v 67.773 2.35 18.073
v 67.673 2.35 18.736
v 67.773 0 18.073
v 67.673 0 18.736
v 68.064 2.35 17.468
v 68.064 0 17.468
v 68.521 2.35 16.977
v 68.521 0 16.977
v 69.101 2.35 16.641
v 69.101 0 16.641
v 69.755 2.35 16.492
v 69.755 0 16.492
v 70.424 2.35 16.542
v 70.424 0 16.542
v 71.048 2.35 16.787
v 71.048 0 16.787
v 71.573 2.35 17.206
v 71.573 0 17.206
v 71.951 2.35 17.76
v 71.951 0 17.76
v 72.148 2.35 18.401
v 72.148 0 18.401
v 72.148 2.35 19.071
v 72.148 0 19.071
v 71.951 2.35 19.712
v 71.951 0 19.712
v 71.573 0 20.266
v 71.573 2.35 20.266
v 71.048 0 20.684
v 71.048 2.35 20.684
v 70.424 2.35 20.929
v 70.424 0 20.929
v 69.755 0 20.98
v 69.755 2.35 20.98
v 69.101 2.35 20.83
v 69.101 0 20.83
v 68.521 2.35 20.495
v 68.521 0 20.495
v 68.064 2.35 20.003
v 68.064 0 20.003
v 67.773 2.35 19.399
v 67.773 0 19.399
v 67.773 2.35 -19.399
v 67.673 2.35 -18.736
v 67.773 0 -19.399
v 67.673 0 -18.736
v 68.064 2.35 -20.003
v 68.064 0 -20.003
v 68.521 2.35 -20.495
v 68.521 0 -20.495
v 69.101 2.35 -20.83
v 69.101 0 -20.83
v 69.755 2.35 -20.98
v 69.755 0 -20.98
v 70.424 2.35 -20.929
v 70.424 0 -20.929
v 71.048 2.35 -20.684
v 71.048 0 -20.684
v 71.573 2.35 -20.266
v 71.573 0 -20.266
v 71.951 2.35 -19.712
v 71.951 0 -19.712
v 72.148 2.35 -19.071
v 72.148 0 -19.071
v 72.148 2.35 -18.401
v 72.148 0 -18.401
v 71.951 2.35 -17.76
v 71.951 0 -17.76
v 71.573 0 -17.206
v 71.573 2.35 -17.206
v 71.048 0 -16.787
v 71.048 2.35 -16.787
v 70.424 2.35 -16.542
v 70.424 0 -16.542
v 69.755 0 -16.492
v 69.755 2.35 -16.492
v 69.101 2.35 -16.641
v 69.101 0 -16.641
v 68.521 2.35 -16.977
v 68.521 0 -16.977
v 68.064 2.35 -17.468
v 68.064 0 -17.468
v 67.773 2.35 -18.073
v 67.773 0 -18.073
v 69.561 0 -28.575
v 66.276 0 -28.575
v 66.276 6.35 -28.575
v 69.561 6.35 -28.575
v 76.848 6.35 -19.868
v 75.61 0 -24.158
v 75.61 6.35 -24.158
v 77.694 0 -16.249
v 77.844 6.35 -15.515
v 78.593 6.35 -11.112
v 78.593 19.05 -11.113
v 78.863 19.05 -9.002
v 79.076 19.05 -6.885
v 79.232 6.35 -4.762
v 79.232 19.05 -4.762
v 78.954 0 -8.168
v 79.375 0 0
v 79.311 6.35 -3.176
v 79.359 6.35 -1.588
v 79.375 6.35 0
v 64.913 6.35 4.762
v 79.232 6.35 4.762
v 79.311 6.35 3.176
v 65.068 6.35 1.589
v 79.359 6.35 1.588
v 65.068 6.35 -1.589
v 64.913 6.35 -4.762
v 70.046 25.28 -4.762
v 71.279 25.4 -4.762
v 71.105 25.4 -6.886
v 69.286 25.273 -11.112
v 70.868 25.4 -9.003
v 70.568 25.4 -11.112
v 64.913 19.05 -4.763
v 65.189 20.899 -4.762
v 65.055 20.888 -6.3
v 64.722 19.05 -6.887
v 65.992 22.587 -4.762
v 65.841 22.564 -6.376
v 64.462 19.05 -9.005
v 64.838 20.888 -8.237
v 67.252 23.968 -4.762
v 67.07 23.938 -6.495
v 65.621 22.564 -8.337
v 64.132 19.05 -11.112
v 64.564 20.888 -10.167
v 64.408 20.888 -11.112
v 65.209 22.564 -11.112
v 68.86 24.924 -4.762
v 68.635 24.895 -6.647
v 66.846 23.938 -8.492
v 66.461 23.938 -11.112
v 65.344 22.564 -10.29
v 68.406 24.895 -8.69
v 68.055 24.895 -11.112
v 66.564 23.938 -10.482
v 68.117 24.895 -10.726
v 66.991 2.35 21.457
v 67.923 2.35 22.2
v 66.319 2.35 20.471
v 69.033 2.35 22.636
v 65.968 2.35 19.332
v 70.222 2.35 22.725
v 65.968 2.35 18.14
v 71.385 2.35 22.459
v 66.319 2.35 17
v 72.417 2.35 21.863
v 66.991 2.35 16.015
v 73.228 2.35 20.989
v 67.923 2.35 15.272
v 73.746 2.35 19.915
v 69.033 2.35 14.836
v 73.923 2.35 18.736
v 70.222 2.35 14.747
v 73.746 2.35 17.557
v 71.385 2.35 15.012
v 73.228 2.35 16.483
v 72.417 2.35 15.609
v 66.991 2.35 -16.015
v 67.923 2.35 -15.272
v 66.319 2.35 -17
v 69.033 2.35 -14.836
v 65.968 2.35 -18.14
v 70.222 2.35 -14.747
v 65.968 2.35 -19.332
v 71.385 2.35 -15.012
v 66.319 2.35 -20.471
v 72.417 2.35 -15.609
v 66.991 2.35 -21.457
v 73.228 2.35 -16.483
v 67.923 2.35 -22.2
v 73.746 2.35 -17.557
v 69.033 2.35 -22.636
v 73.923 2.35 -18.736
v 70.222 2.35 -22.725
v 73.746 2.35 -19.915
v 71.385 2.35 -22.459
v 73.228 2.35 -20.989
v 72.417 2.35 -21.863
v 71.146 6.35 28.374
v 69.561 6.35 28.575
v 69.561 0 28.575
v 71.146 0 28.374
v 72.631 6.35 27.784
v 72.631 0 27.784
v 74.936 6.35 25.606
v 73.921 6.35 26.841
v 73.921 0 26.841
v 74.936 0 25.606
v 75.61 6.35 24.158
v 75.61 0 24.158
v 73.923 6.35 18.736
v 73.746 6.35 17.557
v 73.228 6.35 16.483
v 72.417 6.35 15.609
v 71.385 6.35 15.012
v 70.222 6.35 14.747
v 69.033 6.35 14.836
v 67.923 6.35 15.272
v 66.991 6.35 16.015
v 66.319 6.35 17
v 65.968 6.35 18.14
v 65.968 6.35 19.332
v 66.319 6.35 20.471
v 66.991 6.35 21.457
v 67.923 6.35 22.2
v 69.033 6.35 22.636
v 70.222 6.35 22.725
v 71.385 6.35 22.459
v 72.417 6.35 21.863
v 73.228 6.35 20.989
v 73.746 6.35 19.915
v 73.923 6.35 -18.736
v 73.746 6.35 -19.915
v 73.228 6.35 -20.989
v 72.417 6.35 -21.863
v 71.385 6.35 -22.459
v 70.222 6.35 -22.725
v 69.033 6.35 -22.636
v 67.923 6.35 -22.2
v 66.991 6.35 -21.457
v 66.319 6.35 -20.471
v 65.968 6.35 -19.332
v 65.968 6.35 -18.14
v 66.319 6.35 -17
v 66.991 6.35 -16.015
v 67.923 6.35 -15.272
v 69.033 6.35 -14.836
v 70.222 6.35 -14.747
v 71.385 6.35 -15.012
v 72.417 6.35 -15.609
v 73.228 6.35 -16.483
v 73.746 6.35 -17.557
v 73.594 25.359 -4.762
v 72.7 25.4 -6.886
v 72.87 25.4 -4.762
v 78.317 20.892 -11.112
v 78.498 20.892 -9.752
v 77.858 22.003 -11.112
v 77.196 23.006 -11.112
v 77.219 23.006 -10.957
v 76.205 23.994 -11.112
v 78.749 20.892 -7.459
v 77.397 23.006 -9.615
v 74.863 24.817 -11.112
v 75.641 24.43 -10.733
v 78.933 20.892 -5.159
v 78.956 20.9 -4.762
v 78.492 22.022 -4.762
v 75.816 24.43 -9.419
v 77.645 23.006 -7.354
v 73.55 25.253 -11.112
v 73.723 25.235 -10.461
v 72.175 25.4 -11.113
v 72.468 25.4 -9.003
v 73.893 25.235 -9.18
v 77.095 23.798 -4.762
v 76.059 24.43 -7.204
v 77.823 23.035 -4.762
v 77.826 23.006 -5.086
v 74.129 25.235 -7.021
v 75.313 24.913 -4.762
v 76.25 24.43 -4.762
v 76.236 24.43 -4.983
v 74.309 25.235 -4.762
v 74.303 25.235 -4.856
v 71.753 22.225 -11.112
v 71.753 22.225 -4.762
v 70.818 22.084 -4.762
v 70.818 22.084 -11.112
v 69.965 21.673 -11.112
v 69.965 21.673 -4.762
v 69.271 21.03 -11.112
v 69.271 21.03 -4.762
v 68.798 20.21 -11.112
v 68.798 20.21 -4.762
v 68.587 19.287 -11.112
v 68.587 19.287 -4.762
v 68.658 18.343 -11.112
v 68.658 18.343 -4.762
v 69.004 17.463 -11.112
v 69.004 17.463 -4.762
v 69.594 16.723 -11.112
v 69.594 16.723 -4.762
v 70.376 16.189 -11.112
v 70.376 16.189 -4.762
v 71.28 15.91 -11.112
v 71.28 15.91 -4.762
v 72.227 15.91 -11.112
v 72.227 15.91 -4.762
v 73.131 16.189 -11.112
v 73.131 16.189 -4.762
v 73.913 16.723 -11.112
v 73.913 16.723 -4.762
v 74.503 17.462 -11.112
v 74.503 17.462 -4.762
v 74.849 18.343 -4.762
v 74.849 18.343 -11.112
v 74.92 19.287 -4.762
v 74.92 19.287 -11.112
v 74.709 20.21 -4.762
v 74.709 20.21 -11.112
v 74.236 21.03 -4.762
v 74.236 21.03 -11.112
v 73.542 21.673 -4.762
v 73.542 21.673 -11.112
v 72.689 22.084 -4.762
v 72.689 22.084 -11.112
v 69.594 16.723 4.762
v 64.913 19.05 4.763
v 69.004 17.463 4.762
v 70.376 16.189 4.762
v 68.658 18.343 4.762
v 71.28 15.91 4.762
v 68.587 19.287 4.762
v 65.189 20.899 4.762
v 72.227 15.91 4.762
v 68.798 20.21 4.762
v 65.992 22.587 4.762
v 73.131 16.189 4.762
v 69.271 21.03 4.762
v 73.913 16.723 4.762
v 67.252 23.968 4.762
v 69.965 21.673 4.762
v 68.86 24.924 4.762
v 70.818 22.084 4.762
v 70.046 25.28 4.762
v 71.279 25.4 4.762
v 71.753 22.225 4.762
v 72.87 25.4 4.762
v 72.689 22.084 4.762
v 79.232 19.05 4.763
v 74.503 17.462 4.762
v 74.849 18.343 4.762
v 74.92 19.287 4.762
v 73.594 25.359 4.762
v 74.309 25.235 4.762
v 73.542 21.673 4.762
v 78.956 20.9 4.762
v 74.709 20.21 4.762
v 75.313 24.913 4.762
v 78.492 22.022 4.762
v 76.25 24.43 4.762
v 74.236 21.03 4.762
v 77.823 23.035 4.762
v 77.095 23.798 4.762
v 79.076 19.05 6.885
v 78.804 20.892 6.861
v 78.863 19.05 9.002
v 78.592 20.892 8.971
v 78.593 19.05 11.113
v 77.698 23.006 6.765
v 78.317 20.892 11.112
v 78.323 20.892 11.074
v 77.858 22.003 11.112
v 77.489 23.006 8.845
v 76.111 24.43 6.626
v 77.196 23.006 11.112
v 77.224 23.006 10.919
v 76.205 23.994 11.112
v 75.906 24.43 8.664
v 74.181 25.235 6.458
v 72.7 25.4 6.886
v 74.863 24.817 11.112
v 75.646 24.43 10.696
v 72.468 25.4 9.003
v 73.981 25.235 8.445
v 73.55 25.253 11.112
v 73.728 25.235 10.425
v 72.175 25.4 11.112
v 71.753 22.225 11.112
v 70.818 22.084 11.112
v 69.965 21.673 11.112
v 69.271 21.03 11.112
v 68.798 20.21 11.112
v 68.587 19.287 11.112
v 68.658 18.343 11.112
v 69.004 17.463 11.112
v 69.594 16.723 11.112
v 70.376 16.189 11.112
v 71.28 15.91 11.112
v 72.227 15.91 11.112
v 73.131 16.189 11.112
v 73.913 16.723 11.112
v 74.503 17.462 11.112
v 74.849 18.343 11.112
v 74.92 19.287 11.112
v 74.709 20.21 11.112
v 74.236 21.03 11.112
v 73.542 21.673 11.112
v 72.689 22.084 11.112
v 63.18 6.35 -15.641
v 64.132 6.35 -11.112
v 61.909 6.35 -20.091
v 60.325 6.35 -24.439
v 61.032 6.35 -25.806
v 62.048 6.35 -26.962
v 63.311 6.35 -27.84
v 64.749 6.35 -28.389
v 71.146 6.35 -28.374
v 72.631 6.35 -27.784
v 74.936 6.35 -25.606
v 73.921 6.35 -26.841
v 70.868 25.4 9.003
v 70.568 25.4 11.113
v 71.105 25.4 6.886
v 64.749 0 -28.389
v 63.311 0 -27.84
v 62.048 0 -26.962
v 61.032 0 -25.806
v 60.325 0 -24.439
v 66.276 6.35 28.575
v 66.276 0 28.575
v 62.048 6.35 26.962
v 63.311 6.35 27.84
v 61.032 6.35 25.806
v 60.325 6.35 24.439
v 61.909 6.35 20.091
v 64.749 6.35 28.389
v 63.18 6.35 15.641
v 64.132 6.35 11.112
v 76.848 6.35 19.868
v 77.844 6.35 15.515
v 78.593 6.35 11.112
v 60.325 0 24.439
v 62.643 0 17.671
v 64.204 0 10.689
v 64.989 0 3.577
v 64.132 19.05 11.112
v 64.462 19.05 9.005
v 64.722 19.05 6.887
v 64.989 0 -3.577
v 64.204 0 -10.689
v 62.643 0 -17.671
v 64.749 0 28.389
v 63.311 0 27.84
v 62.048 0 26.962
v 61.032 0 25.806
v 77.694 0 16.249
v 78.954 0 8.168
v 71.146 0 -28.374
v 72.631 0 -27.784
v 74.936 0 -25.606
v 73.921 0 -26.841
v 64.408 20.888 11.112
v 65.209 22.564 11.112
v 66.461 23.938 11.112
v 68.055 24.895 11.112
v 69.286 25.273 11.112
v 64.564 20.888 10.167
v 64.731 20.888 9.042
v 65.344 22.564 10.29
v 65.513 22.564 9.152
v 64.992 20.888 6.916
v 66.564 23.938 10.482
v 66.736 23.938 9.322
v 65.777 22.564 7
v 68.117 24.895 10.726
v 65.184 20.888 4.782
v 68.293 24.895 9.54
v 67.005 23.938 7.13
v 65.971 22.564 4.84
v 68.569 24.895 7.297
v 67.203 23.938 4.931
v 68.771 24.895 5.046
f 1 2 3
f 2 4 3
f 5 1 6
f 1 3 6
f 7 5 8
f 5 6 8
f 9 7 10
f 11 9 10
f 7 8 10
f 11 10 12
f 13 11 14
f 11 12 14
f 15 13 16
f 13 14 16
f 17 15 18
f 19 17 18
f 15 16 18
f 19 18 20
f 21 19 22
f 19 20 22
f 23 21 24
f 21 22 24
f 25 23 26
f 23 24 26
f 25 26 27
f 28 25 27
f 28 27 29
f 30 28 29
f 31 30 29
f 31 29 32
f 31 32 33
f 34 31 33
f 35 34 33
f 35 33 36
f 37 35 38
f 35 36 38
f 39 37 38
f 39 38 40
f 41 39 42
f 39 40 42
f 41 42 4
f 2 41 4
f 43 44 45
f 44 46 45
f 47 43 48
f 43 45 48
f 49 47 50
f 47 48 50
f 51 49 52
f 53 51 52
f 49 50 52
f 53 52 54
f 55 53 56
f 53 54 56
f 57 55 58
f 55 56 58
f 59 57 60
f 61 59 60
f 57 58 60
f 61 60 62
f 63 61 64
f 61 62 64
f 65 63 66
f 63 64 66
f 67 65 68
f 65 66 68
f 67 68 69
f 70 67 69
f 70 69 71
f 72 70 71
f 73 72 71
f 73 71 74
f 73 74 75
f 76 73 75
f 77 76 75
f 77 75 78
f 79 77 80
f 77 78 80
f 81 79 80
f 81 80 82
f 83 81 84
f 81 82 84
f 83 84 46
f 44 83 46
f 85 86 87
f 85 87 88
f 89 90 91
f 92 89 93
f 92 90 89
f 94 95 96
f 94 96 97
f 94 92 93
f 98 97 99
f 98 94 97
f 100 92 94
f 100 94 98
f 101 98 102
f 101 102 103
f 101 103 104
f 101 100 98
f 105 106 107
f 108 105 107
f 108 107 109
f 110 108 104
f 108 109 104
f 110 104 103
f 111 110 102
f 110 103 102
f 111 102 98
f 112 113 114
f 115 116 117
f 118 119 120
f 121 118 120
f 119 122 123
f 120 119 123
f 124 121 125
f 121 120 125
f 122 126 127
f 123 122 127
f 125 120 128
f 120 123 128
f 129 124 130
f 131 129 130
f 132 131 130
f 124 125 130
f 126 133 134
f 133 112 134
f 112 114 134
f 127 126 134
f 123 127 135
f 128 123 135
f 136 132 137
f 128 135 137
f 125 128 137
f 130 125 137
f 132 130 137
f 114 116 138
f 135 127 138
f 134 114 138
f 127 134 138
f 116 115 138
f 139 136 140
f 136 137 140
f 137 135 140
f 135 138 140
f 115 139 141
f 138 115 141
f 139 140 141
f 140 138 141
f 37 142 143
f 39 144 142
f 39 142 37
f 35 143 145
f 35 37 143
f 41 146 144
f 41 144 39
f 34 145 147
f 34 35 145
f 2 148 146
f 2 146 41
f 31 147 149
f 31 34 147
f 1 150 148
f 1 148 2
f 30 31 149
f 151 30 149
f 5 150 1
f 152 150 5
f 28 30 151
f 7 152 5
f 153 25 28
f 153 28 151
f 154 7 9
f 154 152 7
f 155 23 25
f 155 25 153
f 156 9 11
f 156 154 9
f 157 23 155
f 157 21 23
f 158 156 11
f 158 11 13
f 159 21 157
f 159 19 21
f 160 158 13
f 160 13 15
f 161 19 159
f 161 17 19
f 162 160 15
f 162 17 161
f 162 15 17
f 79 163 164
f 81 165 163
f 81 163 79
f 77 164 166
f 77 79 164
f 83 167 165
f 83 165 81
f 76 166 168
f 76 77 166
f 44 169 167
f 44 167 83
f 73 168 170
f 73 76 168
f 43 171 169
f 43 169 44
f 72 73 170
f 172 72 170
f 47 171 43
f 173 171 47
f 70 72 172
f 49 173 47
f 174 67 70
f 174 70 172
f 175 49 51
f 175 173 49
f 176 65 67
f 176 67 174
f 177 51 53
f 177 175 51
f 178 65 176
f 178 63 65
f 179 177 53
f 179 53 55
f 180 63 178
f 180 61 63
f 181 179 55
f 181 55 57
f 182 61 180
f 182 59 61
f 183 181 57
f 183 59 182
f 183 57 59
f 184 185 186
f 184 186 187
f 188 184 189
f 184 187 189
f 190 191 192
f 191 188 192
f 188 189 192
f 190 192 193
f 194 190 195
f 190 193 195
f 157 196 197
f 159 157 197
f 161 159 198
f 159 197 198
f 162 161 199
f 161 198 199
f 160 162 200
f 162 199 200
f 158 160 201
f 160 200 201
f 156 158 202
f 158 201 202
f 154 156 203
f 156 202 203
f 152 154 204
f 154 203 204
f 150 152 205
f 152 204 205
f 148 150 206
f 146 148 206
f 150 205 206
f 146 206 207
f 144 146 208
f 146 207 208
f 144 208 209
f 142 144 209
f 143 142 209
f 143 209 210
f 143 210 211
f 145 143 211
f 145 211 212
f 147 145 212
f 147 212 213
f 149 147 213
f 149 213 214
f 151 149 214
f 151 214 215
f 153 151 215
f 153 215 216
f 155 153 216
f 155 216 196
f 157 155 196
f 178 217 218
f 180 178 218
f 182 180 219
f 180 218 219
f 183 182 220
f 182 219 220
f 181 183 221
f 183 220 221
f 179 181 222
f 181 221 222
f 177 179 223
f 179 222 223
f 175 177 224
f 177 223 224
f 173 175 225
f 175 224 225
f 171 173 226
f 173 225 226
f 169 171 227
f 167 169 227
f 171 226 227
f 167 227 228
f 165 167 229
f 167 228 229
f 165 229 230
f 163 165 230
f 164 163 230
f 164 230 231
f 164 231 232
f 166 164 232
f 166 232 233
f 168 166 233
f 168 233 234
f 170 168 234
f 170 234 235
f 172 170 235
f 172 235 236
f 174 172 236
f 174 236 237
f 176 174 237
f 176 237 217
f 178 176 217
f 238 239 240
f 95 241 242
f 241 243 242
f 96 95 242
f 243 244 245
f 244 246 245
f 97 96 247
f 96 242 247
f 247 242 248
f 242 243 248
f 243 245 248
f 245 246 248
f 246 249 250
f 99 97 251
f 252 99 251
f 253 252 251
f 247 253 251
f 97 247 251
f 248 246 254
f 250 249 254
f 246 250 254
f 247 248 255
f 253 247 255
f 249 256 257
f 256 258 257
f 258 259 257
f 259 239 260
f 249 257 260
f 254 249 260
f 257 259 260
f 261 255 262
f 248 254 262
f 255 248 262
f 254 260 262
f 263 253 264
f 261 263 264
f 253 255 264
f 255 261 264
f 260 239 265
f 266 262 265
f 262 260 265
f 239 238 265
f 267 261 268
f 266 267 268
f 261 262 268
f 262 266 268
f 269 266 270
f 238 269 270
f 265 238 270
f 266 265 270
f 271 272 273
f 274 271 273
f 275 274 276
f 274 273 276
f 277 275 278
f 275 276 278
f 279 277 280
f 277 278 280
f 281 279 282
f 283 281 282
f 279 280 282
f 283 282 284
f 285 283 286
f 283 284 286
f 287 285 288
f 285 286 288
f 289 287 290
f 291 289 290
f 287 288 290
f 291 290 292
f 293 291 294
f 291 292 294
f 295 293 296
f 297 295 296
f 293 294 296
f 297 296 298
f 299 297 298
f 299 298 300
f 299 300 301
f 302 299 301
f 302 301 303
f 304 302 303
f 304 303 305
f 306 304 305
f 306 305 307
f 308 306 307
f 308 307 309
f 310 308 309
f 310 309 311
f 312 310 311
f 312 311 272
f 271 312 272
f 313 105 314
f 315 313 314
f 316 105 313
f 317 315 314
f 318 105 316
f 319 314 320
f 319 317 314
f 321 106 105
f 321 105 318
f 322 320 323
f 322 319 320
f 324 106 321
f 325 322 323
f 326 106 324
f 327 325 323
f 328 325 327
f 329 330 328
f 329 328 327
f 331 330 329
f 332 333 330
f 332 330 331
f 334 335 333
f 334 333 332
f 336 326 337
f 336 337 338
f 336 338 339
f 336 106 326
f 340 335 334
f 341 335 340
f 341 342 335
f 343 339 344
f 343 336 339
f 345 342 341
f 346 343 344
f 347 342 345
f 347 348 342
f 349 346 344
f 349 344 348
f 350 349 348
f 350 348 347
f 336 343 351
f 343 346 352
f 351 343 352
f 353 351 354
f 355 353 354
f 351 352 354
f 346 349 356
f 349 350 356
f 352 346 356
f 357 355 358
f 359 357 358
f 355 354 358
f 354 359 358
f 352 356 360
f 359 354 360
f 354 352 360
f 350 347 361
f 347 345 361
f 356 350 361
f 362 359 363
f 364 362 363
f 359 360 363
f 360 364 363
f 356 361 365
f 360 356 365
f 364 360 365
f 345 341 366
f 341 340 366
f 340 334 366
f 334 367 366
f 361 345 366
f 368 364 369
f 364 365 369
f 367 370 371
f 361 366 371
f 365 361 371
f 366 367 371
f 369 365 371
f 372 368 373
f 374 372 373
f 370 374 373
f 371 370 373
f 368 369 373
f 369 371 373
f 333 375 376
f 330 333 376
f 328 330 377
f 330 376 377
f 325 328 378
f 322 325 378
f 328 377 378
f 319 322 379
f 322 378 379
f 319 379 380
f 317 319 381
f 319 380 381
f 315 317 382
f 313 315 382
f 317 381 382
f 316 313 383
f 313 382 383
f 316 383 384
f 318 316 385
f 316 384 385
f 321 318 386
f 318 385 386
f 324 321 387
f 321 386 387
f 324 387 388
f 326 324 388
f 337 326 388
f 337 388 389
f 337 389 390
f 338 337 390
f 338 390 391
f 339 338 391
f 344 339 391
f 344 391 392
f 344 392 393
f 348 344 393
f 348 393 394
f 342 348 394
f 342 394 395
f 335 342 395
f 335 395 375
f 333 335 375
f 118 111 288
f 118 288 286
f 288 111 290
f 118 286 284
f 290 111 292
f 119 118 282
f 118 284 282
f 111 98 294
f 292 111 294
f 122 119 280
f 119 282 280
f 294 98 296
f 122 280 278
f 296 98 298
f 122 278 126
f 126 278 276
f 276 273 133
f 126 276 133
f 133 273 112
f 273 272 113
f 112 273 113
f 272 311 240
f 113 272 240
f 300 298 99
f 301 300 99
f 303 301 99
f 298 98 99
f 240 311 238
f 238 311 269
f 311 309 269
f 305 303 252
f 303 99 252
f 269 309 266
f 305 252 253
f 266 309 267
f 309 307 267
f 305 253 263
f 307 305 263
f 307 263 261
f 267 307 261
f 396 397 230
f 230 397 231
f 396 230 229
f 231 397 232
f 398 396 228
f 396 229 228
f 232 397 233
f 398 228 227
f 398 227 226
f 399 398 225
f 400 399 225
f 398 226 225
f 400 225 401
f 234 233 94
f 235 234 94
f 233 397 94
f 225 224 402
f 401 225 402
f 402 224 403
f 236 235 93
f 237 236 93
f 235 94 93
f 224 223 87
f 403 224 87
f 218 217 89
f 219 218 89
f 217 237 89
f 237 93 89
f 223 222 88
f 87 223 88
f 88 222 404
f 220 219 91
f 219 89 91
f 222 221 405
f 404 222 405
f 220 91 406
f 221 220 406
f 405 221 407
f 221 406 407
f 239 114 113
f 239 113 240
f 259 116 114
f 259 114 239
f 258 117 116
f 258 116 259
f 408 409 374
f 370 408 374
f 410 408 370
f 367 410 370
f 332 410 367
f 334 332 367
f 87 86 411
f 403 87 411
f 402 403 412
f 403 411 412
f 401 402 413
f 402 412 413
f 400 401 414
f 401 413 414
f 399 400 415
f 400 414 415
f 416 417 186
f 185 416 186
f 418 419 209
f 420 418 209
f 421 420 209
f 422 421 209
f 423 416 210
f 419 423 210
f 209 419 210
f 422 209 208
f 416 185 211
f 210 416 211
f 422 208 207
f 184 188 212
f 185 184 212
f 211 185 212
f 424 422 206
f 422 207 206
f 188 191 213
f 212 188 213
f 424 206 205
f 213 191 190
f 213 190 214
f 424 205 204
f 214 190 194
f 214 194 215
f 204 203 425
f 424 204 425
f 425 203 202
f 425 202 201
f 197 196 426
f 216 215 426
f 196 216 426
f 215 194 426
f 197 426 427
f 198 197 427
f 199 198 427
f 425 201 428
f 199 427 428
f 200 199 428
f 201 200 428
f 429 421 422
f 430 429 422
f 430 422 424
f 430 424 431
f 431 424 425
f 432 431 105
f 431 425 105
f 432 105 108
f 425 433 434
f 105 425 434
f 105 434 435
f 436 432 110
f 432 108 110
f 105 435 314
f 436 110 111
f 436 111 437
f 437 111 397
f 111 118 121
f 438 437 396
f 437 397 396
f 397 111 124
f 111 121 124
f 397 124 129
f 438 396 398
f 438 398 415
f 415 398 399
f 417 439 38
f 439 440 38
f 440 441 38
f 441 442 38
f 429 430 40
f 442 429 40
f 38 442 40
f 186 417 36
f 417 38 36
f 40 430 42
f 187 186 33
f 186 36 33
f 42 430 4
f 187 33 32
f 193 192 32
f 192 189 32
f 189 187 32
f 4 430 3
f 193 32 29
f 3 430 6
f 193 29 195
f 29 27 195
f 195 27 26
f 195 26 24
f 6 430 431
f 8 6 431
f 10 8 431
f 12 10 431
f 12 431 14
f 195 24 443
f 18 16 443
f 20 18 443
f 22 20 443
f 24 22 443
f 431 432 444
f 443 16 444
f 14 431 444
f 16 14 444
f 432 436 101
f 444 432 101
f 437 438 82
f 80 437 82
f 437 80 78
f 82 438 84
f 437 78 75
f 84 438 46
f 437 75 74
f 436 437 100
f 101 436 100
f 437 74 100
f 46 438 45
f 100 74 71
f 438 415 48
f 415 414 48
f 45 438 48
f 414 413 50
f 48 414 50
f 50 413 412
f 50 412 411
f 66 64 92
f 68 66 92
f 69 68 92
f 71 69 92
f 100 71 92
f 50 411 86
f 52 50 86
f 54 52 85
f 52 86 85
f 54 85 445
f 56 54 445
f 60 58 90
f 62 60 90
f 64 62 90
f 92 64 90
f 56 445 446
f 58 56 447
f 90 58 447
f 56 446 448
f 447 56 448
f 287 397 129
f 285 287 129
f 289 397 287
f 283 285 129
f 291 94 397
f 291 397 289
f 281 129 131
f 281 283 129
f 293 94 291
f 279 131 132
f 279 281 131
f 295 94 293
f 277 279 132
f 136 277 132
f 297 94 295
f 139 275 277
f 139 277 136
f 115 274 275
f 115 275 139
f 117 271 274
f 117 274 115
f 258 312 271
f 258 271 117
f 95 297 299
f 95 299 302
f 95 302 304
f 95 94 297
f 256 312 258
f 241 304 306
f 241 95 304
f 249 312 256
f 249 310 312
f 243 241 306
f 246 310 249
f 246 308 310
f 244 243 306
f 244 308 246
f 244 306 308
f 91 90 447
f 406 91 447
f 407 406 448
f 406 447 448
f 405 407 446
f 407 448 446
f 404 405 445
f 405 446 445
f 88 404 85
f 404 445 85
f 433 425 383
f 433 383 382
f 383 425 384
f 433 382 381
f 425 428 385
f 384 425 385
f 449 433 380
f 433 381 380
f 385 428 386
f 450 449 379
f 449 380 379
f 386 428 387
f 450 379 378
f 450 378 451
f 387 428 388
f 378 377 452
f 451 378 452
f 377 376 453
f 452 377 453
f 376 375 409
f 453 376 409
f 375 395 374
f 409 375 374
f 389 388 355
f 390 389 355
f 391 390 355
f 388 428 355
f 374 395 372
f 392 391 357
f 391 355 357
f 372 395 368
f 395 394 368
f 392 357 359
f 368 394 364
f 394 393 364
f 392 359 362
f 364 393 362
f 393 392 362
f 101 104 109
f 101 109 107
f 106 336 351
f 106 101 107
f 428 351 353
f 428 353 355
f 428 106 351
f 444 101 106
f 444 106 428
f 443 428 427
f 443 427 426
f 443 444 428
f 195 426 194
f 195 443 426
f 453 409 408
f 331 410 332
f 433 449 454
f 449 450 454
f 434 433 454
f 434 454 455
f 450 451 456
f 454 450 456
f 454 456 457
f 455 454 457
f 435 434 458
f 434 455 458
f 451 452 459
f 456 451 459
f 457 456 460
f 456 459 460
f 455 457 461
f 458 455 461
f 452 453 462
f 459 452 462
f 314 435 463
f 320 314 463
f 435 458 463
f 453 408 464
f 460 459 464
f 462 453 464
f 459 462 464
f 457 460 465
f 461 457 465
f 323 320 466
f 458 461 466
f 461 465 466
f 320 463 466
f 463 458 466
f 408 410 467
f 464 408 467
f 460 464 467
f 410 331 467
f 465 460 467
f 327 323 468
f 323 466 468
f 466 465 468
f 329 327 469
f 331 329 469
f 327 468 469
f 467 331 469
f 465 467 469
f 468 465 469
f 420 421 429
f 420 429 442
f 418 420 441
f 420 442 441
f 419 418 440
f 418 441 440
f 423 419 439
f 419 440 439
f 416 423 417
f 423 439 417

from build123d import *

# Parameters (mm, degrees)
SKETCH1_W                      = 19.05
SKETCH1_H                      = 57.15
BOSS_EXTRUDE1_DEPTH            = 25.4
SKETCH8_R                      = 65.0875
CUT_EXTRUDE2_DEPTH             = 89.102674477
SKETCH2_W                      = 17.4625
SKETCH2_H                      = 19.05
SKETCH2_W_2                    = 9.525
CUT_EXTRUDE1_DEPTH             = 43.715256349
CBORE_FOR_M4_SHCS1_D           = 4.5
CBORE_FOR_M4_SHCS1_CBORE_D     = 8
CBORE_FOR_M4_SHCS1_CBORE_DEPTH = 4
SKETCH9_R                      = 3.175
CUT_EXTRUDE3_DEPTH             = 93.307357677
CUT_EXTRUDE4_START             = -6.35
CUT_EXTRUDE4_DEPTH             = 25.4
FILLET1_R                      = 6.35
FILLET2_R                      = 6.35


# Read off the part's stored shape, not the designer's step: Cut-Extrude4
with BuildPart() as part:
    # Sketch1 → Boss-Extrude1 (new body)
    with BuildSketch(Plane(origin=(0, 0, 0), x_dir=(1, 0, 0), z_dir=(0, 1, 0))):
        with Locations((69.85, 0)):
            Rectangle(SKETCH1_W, SKETCH1_H)
    extrude(amount=BOSS_EXTRUDE1_DEPTH)

    # Sketch8 → Cut-Extrude2 (cut, through all)
    with BuildSketch(Plane(origin=(0, 25.4, 0), x_dir=(1, 0, 0), z_dir=(0, 1, 0))):
        Circle(SKETCH8_R)
    extrude(amount=-CUT_EXTRUDE2_DEPTH, mode=Mode.SUBTRACT)

    # Sketch2 → Cut-Extrude1 (cut, through all)
    with BuildSketch(Plane(origin=(79.375, 0, 0), x_dir=(0, 0, -1), z_dir=(1, 0, 0))):
        with Locations((-19.84375, 15.875)):
            Rectangle(SKETCH2_W, SKETCH2_H)
        with Locations((0, 15.875)):
            Rectangle(SKETCH2_W_2, SKETCH2_H)
        with Locations((19.84375, 15.875)):
            Rectangle(SKETCH2_W, SKETCH2_H)
    extrude(amount=-CUT_EXTRUDE1_DEPTH, mode=Mode.SUBTRACT)

    # CBORE for M4 SHCS1 (through all)
    with Locations(Plane(origin=(0, 6.35, 0), x_dir=(1, 0, 0), z_dir=(0, 1, 0))):
        with Locations((69.923370565, -18.735910675), (69.923370565, 18.735910675)):
            CounterBoreHole(CBORE_FOR_M4_SHCS1_D / 2, CBORE_FOR_M4_SHCS1_CBORE_D / 2, CBORE_FOR_M4_SHCS1_CBORE_DEPTH)

    # Sketch9 → Cut-Extrude3 (cut, through all)
    with BuildSketch(Plane.XY.offset(11.1125)):
        with Locations(Location((71.753428179, 19.05, 0), (0, 0, 90))):
            Circle(SKETCH9_R)
    extrude(amount=-CUT_EXTRUDE3_DEPTH, mode=Mode.SUBTRACT)

    # Cut-Extrude4 outline → Cut-Extrude4 (cut)
    with BuildSketch(Plane(origin=(0, 6.35, 0), x_dir=(1, 0, 0), z_dir=(0, 1, 0)).offset(CUT_EXTRUDE4_START)):
        with BuildLine():
            ThreePointArc((74.053089065, 28.575), (78.033180665, 14.533180665), (79.375, 0))
            Line((79.375, 0), (79.375, 28.575))
            Line((79.375, 28.575), (74.053089065, 28.575))
        make_face()
        with BuildLine():
            ThreePointArc((79.375, 0), (78.033180665, -14.533180665), (74.053089065, -28.575))
            Line((74.053089065, -28.575), (79.375, -28.575))
            Line((79.375, -28.575), (79.375, 0))
        make_face()
    extrude(amount=CUT_EXTRUDE4_DEPTH, mode=Mode.SUBTRACT)

    # Fillet1
    fillet1_edges = [part.edges().sort_by_distance(p)[0] for p in [
        (78.976482118, 25.4, 7.943922032),
        (78.976482118, 25.4, -7.943922032),
        (64.600512324, 25.4, 7.947104106),
        (64.600512324, 25.4, -7.947104106),
    ]]
    fillet(fillet1_edges, radius=FILLET1_R)

    # Fillet2
    # the kernel refuses this fillet: 6.35 mm, written as the material it takes off along each edge
    with BuildSketch(Plane(origin=(60.325, -14.878589634, -28.575), x_dir=(1, 0, 0), z_dir=(0, 1, 0))) as fillet2_piece_1:
        with BuildLine():
            CenterArc((5.951435854, -6.35), FILLET2_R, 90, 69.592112093)
            Line((0, -4.135748145), (-0.119028717, -4.091463108))
            ThreePointArc((-0.119028717, -4.091463108), (-0.127, -2.067874072), (-0.127, 0))
            Line((-0.127, 0), (0, 0.127))
            Line((0, 0.127), (5.951435854, 0.127))
            Line((5.951435854, 0.127), (5.951435854, 0))
        make_face()
    extrude(amount=36.107179269, mode=Mode.SUBTRACT)
    with BuildSketch(Plane(origin=(74.053089065, -11.708929515, -28.575), x_dir=(0.33231857215714583, 0, 0.9431671997050343), z_dir=(0, 1, 0))) as fillet2_piece_2:
        with BuildLine():
            CenterArc((4.496228934, -6.347235827), FILLET2_R, 88.309367925, 72.281068131)
            Line((-1.492882784, -4.237012894), (-1.612665019, -4.194808436))
            Line((-1.612665019, -4.194808436), (-0.119782234, 0.042204459))
            Line((-0.119782234, 0.042204459), (-0.003746857, 0.126944717))
            ThreePointArc((-0.003746857, 0.126944717), (2.341785903, 0.161552158), (4.687318663, 0.126944717))
            Line((4.687318663, 0.126944717), (4.683571806, 0))
        make_face()
    extrude(amount=29.76785903, mode=Mode.SUBTRACT)
    with BuildSketch(Plane(origin=(60.325, -14.878589634, 28.575), x_dir=(1, 0, 0), z_dir=(0, 1, 0))) as fillet2_piece_3:
        with BuildLine():
            CenterArc((5.951435854, 6.35), FILLET2_R, 200.407887907, 69.592112093)
            Line((0, 4.135748145), (-0.119028717, 4.091463108))
            ThreePointArc((-0.119028717, 4.091463108), (-0.127, 2.067874072), (-0.127, 0))
            Line((-0.127, 0), (0, -0.127))
            Line((0, -0.127), (5.951435854, -0.127))
            Line((5.951435854, -0.127), (5.951435854, 0))
        make_face()
    extrude(amount=36.107179269, mode=Mode.SUBTRACT)
    with BuildSketch(Plane(origin=(74.053089065, -11.708929515, 28.575), x_dir=(0.3323185721571436, 0, -0.943167199705035), z_dir=(0, 1, 0))) as fillet2_piece_4:
        with BuildLine():
            CenterArc((4.496228934, 6.347235827), FILLET2_R, 199.409563944, 72.281068131)
            Line((-1.492882784, 4.237012894), (-1.612665019, 4.194808436))
            Line((-1.612665019, 4.194808436), (-0.119782234, -0.042204459))
            Line((-0.119782234, -0.042204459), (-0.003746857, -0.126944717))
            ThreePointArc((-0.003746857, -0.126944717), (2.341785903, -0.161552158), (4.687318663, -0.126944717))
            Line((4.687318663, -0.126944717), (4.683571806, 0))
        make_face()
    extrude(amount=29.76785903, mode=Mode.SUBTRACT)


solid = part.part
